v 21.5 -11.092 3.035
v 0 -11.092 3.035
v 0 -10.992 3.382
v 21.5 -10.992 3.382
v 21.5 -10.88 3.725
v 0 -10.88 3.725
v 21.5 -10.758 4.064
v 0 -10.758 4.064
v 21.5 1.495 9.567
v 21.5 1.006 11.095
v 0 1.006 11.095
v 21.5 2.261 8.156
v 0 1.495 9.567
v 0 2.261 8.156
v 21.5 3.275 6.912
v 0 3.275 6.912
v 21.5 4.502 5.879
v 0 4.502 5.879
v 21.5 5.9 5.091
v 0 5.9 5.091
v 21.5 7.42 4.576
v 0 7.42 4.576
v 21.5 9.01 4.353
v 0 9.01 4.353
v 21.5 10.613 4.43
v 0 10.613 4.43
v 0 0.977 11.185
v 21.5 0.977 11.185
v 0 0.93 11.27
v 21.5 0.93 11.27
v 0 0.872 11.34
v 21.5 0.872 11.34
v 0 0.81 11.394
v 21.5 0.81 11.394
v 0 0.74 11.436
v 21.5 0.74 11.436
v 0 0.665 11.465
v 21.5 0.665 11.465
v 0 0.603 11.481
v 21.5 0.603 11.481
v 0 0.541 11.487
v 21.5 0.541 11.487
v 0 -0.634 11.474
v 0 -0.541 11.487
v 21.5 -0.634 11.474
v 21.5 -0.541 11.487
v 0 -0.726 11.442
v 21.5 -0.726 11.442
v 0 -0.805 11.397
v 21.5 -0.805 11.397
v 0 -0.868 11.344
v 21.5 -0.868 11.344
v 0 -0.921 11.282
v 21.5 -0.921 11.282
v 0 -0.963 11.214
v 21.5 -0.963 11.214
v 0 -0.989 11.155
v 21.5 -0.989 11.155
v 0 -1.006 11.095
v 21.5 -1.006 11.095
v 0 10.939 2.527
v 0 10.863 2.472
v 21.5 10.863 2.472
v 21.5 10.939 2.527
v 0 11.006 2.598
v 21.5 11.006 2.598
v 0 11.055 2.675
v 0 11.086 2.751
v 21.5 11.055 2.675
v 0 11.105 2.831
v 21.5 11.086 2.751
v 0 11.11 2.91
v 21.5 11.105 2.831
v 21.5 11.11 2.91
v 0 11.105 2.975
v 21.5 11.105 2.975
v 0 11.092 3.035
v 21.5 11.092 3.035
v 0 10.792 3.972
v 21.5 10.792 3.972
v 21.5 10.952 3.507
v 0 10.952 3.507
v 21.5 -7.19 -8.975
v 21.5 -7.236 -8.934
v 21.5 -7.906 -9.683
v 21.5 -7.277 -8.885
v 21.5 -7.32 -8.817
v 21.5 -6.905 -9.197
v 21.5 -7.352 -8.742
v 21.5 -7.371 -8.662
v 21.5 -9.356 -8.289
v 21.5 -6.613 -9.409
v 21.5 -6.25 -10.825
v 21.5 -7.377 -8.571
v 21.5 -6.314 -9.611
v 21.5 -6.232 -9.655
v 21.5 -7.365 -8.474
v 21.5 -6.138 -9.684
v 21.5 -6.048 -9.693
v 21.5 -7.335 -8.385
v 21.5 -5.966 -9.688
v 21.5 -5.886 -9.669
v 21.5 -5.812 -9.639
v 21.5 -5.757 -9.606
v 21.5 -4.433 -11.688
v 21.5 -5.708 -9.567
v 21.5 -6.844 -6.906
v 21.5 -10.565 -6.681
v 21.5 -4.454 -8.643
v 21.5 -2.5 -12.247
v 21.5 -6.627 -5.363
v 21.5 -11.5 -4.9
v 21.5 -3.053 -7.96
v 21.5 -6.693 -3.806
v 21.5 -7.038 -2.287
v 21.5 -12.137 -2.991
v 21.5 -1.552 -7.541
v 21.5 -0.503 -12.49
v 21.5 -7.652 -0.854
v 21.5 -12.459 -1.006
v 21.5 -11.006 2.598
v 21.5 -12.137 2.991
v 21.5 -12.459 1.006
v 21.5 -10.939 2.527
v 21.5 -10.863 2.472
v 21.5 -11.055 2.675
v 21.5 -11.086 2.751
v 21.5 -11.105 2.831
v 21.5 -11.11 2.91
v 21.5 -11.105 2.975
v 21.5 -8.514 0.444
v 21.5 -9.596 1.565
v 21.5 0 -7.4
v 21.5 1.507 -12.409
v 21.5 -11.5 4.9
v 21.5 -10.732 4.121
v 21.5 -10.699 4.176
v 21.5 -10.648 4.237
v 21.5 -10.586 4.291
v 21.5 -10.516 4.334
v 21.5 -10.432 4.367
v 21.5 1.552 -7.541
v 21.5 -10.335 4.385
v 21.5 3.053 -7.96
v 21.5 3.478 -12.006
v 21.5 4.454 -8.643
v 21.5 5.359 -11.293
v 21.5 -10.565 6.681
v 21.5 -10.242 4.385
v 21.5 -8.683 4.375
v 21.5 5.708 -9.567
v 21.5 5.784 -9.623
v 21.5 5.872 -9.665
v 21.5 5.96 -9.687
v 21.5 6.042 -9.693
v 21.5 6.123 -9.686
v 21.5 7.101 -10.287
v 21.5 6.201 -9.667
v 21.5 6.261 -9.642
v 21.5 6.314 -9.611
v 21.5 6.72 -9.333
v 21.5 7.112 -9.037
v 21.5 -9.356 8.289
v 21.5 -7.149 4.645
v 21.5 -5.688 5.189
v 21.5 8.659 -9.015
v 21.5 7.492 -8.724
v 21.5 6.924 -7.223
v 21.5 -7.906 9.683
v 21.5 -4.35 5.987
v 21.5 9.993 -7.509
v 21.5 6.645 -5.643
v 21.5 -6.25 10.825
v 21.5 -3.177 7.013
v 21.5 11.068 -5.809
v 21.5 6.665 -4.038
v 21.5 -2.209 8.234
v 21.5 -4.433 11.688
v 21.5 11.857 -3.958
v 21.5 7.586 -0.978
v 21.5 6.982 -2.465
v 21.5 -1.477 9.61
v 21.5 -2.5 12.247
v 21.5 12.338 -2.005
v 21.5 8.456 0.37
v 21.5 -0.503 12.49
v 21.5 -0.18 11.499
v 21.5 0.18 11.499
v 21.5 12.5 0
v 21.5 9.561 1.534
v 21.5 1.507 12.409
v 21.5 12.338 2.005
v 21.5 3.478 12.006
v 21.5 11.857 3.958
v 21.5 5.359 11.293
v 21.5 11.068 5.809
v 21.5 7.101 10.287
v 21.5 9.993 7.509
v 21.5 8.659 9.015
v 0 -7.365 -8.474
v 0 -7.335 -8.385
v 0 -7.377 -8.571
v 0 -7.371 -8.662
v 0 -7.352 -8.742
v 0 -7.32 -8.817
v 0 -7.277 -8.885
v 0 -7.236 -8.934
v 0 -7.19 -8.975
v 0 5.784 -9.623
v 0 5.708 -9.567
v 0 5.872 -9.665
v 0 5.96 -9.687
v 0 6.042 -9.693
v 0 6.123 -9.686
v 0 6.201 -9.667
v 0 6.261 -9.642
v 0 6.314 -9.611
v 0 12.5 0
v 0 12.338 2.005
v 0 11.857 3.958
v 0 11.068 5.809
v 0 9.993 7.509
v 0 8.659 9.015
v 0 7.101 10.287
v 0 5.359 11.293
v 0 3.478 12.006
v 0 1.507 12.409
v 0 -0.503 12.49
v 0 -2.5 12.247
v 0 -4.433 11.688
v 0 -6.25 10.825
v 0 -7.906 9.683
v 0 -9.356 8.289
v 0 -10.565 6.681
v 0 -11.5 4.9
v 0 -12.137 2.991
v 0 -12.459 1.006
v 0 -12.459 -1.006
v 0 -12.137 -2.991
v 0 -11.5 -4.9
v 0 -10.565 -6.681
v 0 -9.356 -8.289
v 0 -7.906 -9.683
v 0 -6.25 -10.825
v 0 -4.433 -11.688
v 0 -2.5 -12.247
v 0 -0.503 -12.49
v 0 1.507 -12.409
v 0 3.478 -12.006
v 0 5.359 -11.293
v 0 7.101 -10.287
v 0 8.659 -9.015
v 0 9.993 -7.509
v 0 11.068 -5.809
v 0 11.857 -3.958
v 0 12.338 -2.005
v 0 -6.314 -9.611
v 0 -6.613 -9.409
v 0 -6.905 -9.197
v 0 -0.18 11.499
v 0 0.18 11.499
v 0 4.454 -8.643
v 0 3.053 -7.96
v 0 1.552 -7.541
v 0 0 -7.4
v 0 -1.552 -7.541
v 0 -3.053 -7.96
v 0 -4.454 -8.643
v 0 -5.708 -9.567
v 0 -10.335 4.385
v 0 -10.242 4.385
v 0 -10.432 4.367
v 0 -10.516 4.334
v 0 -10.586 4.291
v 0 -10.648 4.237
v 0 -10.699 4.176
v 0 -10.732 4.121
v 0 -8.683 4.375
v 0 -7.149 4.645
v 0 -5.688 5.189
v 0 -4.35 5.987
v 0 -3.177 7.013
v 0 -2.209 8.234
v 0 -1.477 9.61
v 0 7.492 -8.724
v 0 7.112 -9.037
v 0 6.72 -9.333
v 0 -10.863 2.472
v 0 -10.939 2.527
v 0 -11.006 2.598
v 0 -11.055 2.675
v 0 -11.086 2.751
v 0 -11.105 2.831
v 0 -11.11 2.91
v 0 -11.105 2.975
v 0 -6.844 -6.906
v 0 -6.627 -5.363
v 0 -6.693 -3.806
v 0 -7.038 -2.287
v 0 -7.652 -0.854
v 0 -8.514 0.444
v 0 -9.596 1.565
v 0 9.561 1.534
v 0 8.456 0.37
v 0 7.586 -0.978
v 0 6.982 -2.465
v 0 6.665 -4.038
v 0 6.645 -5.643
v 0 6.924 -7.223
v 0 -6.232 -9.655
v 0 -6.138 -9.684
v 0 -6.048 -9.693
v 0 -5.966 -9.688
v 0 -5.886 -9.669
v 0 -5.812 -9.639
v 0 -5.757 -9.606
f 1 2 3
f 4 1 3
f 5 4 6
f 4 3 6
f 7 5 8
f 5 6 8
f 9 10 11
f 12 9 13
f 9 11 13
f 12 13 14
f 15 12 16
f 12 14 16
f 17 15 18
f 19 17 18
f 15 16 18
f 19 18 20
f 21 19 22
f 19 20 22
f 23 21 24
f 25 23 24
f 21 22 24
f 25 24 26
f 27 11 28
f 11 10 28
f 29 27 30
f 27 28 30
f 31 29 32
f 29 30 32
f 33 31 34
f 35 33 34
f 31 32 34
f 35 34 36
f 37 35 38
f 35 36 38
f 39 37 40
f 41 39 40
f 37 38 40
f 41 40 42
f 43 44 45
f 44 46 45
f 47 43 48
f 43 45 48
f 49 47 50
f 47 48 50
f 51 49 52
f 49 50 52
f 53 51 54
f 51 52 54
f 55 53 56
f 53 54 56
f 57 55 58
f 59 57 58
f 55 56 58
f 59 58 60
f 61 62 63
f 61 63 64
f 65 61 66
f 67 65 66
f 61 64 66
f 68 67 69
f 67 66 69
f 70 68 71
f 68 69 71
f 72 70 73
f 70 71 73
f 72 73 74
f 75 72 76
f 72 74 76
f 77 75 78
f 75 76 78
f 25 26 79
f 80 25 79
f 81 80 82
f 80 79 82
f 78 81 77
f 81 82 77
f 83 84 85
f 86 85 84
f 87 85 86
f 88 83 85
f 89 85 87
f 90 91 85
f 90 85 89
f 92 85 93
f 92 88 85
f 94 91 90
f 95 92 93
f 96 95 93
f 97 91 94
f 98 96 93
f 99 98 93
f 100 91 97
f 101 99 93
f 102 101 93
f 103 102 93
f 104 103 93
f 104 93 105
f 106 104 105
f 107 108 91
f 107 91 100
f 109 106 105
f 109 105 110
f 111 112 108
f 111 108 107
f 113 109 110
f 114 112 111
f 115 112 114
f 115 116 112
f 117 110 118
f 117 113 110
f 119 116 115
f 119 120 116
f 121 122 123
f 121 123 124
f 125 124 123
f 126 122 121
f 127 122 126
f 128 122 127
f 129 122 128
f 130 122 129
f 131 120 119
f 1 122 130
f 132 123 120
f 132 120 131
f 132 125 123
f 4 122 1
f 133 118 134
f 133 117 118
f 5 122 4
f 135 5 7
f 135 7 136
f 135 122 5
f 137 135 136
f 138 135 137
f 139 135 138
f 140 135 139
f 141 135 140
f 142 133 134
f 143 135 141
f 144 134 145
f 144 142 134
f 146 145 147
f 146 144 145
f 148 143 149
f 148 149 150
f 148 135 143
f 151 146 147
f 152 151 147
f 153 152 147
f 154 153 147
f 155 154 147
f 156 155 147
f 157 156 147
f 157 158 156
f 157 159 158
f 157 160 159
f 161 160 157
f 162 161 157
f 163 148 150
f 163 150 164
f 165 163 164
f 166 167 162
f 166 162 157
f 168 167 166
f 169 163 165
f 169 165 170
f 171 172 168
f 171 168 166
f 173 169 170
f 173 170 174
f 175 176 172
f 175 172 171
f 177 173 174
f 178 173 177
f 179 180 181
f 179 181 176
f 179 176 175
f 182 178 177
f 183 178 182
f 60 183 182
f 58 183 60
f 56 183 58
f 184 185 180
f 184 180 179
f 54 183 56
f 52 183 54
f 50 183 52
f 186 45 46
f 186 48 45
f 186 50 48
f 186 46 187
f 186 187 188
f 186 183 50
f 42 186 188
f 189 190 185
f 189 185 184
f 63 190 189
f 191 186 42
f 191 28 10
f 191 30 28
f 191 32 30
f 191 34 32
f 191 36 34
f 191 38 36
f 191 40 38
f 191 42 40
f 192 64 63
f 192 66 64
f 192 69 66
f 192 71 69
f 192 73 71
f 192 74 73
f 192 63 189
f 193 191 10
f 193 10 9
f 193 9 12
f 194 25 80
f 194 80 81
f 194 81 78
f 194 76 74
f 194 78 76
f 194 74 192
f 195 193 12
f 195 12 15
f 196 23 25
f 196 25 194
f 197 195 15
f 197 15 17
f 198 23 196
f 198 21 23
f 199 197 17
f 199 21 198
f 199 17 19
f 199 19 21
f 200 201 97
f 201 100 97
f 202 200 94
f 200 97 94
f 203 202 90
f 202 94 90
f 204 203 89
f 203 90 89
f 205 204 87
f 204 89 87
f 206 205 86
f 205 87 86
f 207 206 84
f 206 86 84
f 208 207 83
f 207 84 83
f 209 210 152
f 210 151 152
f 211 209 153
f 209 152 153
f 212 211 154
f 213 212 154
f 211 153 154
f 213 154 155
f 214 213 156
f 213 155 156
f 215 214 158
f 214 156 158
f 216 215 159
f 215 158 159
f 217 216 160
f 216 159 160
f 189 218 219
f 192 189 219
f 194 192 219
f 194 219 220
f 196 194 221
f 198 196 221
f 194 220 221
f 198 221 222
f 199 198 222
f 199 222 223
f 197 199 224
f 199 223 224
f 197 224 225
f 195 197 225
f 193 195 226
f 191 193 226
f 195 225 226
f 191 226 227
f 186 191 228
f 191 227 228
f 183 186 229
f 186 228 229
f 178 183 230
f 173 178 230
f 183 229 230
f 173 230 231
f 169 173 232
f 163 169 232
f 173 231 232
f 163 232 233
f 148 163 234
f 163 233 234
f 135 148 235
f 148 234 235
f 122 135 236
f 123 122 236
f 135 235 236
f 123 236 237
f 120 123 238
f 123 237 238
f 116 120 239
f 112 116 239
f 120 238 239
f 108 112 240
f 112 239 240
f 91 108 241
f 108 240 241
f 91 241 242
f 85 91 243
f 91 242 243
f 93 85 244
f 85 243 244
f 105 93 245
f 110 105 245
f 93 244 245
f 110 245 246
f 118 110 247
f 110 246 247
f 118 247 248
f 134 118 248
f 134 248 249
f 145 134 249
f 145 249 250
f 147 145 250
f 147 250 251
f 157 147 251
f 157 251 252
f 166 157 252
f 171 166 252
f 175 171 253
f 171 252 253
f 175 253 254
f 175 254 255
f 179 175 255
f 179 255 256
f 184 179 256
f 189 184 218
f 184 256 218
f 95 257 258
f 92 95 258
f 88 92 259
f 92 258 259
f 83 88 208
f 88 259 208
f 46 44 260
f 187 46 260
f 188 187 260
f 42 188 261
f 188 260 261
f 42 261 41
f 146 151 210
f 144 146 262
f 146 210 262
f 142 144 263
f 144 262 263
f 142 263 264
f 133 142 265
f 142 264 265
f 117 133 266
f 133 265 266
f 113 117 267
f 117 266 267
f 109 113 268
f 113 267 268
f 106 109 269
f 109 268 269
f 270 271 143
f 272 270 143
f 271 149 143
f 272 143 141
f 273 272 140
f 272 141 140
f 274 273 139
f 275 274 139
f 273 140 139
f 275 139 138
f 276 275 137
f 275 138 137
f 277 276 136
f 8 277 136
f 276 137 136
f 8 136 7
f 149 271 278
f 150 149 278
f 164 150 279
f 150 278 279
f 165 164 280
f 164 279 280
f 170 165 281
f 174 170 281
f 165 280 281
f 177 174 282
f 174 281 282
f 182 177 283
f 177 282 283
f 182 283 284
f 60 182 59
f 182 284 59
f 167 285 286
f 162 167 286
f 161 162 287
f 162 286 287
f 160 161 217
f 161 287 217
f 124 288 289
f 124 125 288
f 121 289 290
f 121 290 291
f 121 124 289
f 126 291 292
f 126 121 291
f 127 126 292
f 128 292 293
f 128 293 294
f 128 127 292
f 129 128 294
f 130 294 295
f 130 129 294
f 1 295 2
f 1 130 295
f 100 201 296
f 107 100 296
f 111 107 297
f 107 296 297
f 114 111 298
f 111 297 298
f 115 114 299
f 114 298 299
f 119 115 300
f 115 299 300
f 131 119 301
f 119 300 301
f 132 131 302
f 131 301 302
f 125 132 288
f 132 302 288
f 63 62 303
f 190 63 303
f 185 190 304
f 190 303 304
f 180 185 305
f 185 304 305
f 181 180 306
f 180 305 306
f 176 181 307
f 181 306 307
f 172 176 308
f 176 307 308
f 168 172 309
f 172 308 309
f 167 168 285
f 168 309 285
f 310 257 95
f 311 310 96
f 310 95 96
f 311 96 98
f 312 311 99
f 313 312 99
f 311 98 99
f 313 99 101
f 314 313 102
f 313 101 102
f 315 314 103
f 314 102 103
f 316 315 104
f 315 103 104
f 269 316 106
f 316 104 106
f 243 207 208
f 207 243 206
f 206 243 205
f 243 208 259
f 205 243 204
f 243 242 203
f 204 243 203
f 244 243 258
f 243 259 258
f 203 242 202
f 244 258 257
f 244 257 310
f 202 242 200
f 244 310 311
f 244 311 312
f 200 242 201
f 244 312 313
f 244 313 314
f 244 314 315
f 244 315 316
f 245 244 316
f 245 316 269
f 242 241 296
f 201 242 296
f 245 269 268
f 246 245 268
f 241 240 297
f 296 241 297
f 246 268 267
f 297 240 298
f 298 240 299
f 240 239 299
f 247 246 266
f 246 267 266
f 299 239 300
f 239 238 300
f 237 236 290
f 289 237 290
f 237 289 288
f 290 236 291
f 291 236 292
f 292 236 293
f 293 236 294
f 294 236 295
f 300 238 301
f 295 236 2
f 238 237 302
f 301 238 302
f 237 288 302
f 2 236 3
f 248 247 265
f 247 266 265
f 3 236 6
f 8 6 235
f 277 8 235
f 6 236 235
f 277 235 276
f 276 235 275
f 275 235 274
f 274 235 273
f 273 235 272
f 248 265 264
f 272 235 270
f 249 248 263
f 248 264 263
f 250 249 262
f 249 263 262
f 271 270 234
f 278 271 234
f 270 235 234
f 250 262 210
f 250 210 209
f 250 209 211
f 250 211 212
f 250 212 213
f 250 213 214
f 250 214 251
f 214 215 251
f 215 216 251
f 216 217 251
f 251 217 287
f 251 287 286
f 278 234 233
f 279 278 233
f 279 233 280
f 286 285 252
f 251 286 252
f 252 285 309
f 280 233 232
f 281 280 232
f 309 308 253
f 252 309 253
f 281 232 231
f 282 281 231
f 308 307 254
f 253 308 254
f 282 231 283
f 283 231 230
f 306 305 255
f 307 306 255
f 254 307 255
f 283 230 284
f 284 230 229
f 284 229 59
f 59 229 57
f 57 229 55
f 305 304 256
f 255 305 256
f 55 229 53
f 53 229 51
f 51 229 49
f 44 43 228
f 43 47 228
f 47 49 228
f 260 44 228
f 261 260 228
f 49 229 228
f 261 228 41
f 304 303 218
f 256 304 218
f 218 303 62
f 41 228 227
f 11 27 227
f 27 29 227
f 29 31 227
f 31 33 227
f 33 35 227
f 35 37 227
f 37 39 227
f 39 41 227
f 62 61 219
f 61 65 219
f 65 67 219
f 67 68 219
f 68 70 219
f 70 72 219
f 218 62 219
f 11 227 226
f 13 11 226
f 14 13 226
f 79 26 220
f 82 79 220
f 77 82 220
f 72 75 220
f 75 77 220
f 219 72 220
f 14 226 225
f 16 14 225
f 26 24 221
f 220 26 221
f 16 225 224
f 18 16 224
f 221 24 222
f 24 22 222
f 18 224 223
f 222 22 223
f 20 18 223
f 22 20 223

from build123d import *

# Parameters (mm, degrees)
F0_R     = 12.5
F1_DEPTH = 21.5
F2_R     = 0.5


with BuildPart() as f1:
    # F0 (on Right) → F1 (new body)
    with BuildSketch(Plane.YZ):
        Circle(F0_R)
        with BuildLine():
            ThreePointArc((-11.189467, 2.654396), (-10.93715, 3.553695), (-10.612684, 4.429553))
            ThreePointArc((-10.612684, 4.429553), (-4.349611, 5.986726), (-0.933255, 11.462069))
            ThreePointArc((-0.933255, 11.462069), (0, 11.5), (0.933255, 11.462069))
            ThreePointArc((0.933255, 11.462069), (4.349611, 5.986726), (10.612684, 4.429553))
            ThreePointArc((10.612684, 4.429553), (10.93715, 3.553695), (11.189467, 2.654396))
            ThreePointArc((11.189467, 2.654396), (7.037818, -2.286726), (7.492255, -8.724455))
            ThreePointArc((7.492255, -8.724455), (6.75953, -9.303695), (5.982216, -9.821562))
            ThreePointArc((5.982216, -9.821562), (0, -7.4), (-5.982216, -9.821562))
            ThreePointArc((-5.982216, -9.821562), (-6.75953, -9.303695), (-7.492255, -8.724455))
            ThreePointArc((-7.492255, -8.724455), (-7.037818, -2.286726), (-11.189467, 2.654396))
        make_face(mode=Mode.SUBTRACT)
    extrude(amount=F1_DEPTH)

    # F2
    f2_edges = [f1.edges().sort_by_distance(p)[0] for p in [
        (10.75, -0.933255, 11.462069),
        (10.75, 0.933255, 11.462069),
        (10.75, -10.612684, 4.429553),
        (10.75, -11.189467, 2.654396),
        (10.75, -7.492255, -8.724455),
        (10.75, -5.982216, -9.821562),
        (10.75, 5.982216, -9.821562),
        (10.75, 11.189467, 2.654396),
    ]]
    fillet(f2_edges, radius=F2_R)


solid = f1.part
